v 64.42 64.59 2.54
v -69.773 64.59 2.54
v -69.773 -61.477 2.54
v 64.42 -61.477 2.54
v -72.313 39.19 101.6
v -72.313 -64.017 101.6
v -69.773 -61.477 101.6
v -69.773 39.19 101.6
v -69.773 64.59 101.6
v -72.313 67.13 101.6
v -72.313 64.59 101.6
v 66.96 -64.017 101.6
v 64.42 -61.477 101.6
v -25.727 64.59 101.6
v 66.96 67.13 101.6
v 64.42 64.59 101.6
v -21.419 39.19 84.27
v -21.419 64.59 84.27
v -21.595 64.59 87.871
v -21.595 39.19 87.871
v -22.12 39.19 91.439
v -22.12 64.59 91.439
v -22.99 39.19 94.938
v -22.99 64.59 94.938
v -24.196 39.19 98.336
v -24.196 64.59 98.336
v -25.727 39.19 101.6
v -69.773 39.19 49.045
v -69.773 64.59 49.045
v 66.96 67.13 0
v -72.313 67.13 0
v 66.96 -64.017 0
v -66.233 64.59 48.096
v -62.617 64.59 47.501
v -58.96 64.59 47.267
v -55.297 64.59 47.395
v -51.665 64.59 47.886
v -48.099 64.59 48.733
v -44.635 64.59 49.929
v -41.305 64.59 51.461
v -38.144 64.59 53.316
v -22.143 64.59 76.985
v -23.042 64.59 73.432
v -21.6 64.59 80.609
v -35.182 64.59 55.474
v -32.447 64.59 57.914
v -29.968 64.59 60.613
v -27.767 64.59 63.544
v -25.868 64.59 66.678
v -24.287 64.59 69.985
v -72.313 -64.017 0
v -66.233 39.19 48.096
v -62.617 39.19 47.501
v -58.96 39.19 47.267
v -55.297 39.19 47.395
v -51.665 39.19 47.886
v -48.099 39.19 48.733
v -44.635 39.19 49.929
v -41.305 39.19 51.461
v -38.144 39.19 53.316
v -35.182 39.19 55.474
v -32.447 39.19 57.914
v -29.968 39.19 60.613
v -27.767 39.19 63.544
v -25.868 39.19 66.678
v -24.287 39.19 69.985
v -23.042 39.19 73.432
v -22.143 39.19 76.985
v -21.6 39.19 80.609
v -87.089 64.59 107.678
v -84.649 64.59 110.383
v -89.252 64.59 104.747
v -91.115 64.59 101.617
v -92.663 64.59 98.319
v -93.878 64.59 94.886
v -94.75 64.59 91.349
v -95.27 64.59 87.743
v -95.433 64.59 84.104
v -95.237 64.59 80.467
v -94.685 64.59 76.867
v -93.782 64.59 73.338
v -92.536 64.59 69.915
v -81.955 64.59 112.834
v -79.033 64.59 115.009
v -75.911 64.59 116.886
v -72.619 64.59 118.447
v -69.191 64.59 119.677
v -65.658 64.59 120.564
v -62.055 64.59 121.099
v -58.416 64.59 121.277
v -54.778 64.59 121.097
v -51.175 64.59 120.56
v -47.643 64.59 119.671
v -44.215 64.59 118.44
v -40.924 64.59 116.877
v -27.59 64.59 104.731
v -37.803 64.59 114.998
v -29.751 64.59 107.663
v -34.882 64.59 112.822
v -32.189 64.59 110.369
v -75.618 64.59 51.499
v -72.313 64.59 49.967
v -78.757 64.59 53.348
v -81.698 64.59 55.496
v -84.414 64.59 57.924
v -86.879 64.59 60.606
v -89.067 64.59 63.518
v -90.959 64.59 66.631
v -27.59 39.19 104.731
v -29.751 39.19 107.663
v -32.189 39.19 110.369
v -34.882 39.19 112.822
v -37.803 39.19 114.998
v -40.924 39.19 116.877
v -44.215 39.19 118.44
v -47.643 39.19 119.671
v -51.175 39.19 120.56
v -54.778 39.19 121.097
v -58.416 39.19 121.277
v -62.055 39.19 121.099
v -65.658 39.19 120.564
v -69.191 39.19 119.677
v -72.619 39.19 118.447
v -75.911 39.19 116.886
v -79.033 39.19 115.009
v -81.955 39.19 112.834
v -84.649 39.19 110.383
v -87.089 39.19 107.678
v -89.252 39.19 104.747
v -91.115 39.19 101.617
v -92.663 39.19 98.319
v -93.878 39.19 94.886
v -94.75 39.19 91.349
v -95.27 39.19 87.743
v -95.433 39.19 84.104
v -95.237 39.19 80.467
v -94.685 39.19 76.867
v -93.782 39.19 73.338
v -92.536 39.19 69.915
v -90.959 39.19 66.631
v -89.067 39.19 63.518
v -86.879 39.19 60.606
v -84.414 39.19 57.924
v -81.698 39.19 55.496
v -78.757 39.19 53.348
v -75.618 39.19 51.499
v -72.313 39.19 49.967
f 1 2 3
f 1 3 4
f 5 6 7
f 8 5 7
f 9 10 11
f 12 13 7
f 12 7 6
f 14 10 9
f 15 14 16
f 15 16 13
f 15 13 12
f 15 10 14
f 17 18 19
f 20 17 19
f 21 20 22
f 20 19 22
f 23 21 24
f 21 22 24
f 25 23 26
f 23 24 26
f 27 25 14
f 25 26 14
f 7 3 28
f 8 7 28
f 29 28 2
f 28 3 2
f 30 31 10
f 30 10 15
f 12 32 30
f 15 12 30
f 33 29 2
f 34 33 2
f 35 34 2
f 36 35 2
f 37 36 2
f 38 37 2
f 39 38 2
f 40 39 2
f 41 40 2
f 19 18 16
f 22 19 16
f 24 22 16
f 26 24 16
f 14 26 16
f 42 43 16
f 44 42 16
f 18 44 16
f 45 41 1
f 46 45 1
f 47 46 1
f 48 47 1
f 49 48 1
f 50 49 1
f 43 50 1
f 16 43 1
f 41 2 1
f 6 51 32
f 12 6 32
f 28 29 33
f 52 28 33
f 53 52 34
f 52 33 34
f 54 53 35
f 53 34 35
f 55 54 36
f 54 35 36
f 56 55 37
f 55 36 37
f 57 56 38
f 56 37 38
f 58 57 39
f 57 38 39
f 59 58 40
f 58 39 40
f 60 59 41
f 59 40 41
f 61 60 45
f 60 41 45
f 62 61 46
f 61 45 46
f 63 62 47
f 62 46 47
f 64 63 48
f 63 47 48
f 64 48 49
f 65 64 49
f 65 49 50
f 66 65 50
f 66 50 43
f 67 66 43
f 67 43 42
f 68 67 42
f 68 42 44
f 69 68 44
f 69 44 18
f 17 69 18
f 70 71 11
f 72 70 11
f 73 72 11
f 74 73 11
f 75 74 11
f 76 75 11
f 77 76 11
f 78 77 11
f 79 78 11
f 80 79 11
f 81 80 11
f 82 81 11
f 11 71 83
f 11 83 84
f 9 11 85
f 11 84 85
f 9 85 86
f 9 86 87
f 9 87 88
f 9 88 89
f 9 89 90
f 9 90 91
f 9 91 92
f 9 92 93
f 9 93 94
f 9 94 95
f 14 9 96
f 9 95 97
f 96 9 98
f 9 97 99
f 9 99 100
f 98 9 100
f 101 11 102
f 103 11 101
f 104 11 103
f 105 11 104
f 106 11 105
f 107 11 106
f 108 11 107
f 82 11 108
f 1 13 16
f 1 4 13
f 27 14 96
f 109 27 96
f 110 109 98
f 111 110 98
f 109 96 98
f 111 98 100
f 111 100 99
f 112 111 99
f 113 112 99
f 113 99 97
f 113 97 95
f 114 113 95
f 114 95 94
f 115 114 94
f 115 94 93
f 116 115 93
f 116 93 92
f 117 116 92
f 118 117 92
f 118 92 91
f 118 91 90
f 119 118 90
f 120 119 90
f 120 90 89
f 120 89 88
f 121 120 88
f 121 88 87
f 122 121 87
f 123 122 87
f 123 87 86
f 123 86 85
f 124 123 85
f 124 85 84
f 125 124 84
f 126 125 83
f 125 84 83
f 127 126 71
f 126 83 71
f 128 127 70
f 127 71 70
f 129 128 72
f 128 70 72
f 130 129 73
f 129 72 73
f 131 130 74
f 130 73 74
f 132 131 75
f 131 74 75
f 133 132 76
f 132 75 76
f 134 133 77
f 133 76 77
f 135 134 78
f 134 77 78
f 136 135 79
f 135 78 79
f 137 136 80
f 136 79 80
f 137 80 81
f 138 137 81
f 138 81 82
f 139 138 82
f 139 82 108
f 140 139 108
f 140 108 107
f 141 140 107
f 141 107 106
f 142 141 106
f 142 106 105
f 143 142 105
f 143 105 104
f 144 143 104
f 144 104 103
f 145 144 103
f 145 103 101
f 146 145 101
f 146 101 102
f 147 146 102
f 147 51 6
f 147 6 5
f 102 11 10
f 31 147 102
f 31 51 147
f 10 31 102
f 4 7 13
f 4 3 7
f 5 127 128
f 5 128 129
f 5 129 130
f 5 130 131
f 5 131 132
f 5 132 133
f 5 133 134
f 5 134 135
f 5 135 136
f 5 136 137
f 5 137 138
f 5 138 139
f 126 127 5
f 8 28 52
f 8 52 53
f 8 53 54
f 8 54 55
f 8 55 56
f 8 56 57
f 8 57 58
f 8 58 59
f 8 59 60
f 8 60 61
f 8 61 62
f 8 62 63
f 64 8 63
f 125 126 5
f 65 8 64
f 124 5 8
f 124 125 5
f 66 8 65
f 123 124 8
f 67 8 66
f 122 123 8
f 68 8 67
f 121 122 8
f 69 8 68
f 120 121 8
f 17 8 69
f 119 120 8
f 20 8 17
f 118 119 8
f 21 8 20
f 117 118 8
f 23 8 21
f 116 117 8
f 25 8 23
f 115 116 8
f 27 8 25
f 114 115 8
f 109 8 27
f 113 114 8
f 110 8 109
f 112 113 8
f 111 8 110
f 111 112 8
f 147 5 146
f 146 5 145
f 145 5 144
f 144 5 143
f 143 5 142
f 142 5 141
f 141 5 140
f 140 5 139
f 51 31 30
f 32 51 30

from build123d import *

# Parameters (mm, degrees)
F0_W     = 139.2736807466
F0_H     = 131.1470270157
F1_DEPTH = 101.6
F2_T     = -2.54
F4_DEPTH = 25.4


with BuildPart() as f1:
    # F0 (on Top) → F1 (new body)
    with BuildSketch(Plane.XY):
        with Locations((-2.6764906943, 1.5565976501)):
            Rectangle(F0_W, F0_H)
    extrude(amount=F1_DEPTH)

    # F2
    f2_openings = [f1.faces().sort_by_distance(p)[0] for p in [
        (-2.676491, 1.556598, 101.6),
    ]]
    offset(amount=F2_T, openings=f2_openings)

    # F3 (on face) → F4 (join)
    with BuildSketch(Plane.XZ.offset(-64.5901111579)):
        with BuildLine():
            Line((-69.7733310676, 101.6), (-25.7274541641, 101.6))
            ThreePointArc((-25.7274541641, 101.6), (-86.7891143722, 108.0409788687), (-69.7733310676, 49.0454224709))
            Line((-69.7733310676, 49.0454224709), (-69.7733310676, 101.6))
        make_face()
        with BuildLine():
            ThreePointArc((-69.7733310676, 49.0454224709), (-36.6361593712, 54.3579049697), (-21.4188937376, 84.2699334025))
            ThreePointArc((-21.4188937376, 84.2699334025), (-22.5121831898, 93.1987477306), (-25.7274541641, 101.6))
            Line((-25.7274541641, 101.6), (-69.7733310676, 101.6))
            Line((-69.7733310676, 101.6), (-69.7733310676, 49.0454224709))
        make_face()
    extrude(amount=F4_DEPTH)


solid = f1.part
